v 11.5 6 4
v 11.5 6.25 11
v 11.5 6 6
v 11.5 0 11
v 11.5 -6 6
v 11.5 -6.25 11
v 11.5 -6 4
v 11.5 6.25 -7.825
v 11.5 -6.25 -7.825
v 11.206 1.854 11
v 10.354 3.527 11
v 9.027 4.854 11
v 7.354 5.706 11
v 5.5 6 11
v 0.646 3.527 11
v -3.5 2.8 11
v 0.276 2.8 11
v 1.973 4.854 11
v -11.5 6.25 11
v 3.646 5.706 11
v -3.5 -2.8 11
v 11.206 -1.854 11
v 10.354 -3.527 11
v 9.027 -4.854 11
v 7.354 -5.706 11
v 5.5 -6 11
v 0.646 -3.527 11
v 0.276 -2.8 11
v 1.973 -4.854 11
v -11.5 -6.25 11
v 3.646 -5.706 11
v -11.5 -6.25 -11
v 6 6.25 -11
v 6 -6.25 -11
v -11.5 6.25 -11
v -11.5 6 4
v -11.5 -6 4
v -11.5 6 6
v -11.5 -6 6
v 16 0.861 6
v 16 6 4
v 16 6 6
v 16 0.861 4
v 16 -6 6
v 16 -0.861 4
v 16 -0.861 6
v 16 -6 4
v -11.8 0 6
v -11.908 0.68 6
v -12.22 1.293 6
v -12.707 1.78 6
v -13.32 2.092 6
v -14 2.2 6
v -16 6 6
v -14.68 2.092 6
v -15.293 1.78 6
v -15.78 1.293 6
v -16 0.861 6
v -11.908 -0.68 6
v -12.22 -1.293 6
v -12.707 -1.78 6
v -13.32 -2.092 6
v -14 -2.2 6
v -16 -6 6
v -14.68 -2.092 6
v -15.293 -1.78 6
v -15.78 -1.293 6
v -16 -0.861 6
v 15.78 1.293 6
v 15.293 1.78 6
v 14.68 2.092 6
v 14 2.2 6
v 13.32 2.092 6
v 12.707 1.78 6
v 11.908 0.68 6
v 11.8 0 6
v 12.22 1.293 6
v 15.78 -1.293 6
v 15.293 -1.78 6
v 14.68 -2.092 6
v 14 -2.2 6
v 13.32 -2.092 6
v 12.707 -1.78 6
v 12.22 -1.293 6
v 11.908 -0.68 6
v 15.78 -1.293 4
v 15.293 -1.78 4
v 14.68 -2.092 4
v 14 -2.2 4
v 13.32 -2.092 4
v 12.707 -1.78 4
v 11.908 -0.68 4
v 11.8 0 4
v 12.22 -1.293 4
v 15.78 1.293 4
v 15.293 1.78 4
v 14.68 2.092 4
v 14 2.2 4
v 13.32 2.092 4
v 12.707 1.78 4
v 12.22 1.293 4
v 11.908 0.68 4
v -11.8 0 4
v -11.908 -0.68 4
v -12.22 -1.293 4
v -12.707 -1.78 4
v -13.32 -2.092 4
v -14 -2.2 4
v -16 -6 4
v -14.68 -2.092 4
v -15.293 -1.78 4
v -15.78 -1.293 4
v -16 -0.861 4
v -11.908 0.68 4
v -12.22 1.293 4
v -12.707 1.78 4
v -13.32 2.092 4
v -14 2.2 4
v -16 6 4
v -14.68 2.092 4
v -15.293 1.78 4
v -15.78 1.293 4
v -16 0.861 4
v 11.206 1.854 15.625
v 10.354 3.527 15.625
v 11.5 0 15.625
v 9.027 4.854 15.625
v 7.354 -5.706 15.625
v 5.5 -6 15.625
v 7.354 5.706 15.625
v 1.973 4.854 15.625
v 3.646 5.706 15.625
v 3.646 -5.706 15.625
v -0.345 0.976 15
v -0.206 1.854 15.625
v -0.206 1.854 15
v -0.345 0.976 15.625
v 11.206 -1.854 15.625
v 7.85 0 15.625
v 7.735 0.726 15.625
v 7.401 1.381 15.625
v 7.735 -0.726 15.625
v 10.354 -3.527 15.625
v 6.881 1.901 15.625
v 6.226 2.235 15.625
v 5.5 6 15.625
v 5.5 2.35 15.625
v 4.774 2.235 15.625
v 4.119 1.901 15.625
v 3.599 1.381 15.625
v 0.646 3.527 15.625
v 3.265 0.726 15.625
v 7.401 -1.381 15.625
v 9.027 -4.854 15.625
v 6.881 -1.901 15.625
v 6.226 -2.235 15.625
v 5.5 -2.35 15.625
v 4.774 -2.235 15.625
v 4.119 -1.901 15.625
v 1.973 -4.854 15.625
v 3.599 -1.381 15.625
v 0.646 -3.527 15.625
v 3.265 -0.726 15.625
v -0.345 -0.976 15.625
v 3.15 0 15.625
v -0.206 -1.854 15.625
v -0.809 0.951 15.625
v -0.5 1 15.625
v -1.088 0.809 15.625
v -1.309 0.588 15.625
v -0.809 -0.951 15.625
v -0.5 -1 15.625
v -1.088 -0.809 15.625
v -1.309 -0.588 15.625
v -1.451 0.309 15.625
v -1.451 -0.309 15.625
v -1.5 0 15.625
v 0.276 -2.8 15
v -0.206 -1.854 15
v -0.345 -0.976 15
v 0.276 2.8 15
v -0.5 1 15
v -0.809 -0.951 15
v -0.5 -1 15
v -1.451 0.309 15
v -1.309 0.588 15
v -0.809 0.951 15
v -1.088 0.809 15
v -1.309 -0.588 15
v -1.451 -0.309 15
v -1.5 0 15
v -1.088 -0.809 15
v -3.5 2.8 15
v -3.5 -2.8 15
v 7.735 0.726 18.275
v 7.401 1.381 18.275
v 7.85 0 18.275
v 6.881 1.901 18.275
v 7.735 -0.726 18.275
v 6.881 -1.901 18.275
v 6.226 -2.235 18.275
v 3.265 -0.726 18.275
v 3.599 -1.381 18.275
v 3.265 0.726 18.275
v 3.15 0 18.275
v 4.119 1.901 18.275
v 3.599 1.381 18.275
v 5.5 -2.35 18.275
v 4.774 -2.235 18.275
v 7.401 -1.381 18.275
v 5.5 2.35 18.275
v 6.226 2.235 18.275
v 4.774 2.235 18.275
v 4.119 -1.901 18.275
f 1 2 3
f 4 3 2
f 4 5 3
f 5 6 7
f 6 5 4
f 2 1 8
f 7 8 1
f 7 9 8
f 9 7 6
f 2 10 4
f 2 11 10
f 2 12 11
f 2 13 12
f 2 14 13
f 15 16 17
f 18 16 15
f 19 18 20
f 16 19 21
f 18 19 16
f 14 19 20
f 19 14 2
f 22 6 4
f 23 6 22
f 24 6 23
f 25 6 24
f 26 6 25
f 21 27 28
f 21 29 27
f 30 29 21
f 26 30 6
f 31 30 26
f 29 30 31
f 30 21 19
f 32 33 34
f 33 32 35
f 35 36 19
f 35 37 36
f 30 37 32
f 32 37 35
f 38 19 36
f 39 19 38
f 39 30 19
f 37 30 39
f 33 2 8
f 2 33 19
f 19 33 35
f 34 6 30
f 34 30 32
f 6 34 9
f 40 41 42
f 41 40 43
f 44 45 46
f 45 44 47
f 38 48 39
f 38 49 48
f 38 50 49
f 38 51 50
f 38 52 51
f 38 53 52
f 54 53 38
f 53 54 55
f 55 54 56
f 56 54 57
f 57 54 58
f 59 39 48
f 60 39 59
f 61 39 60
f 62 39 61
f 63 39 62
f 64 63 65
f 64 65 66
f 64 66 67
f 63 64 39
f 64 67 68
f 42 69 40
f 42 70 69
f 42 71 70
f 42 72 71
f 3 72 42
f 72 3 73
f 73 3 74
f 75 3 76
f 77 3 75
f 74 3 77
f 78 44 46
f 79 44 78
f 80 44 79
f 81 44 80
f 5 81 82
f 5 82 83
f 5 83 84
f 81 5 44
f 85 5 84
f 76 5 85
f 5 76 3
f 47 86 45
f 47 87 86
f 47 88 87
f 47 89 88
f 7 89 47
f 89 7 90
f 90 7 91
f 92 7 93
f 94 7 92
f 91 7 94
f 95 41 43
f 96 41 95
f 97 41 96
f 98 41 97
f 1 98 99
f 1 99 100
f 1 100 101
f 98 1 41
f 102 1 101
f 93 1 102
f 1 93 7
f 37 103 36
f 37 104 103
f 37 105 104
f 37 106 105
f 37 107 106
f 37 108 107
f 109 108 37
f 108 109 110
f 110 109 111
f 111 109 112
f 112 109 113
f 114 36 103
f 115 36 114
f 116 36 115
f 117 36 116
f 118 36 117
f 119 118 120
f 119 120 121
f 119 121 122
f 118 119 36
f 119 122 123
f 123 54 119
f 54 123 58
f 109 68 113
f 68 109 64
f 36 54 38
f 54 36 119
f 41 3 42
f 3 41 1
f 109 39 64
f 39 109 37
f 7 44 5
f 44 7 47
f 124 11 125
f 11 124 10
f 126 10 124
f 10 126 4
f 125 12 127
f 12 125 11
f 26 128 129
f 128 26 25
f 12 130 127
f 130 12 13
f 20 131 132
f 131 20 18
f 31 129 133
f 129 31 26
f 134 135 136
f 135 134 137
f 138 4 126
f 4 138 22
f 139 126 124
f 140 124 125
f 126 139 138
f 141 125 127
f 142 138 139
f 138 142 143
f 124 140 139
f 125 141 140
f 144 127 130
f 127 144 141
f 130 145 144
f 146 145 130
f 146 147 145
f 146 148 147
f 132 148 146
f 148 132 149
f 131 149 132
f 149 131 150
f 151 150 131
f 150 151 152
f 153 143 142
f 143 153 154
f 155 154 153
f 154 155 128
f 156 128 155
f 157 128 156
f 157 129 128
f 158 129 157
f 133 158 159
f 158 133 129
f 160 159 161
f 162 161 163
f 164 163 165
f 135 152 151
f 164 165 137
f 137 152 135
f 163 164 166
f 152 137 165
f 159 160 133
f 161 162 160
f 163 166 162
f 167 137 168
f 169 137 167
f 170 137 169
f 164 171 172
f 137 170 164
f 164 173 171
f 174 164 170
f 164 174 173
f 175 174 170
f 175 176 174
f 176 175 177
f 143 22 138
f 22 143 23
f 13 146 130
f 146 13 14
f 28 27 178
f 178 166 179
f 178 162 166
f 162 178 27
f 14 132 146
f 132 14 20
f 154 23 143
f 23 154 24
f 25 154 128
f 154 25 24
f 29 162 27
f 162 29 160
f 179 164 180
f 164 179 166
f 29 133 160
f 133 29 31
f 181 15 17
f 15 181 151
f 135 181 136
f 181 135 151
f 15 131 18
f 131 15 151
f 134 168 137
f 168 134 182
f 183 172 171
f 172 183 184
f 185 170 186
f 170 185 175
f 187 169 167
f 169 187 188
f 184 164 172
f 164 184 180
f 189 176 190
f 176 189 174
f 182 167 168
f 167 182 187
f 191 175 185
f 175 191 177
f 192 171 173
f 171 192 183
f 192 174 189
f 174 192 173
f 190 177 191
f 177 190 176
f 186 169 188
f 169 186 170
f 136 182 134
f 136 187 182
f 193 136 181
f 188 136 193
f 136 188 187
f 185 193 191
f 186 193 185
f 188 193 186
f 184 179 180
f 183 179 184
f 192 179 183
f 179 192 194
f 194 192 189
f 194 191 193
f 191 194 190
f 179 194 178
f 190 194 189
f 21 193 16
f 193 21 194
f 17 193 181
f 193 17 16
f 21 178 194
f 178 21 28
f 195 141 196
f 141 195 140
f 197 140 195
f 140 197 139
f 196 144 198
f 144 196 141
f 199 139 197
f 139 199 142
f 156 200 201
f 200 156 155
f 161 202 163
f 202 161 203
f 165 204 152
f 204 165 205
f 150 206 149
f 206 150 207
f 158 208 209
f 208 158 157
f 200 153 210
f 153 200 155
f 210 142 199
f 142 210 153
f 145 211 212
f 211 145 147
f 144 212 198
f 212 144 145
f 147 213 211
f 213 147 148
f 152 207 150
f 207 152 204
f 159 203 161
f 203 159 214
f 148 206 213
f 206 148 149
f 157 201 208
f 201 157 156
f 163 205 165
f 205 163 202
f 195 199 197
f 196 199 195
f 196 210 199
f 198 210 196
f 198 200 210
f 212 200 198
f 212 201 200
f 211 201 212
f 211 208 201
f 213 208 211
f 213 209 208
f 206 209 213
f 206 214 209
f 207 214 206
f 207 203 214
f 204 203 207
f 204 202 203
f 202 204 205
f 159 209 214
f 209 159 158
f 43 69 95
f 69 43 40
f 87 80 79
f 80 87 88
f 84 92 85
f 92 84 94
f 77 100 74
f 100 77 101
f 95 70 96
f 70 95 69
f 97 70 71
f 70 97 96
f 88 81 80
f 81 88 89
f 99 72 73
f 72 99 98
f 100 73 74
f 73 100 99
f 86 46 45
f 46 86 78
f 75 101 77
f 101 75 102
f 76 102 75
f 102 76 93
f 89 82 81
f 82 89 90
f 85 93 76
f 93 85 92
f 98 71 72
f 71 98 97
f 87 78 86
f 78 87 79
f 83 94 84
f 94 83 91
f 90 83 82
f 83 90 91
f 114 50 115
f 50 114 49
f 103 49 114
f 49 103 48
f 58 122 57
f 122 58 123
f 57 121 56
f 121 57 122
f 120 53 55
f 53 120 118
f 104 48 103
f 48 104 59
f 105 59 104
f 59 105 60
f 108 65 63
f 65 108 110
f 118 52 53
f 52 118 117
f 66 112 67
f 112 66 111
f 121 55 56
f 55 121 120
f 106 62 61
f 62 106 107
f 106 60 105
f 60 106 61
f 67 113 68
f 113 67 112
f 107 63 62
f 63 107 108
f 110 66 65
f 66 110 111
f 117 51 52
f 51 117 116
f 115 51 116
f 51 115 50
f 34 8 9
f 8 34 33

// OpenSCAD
9g_motor();

module 9g_motor(){
	difference(){
		union(){
			color("steel blue") cube([23,12.5,22], center=true);
			color("steel blue") translate([0,0,5]) cube([32,12,2], center=true);
			color("steel blue") translate([5.5,0,2.75]) cylinder(r=6, h=25.75, $fn=20, center=true);
			color("steel blue") translate([-.5,0,2.75]) cylinder(r=1, h=25.75, $fn=20, center=true);
			color("steel blue") translate([-1,0,2.75]) cube([5,5.6,24.5], center=true);
			color("white") translate([5.5,0,3.65]) cylinder(r=2.35, h=29.25, $fn=20, center=true);
		}
		translate([10,0,-11]) rotate([0,-30,0]) cube([8,13,4], center=true);
		for ( hole = [14,-14] ){
			translate([hole,0,5]) cylinder(r=2.2, h=4, $fn=20, center=true);
		}
	}
}
